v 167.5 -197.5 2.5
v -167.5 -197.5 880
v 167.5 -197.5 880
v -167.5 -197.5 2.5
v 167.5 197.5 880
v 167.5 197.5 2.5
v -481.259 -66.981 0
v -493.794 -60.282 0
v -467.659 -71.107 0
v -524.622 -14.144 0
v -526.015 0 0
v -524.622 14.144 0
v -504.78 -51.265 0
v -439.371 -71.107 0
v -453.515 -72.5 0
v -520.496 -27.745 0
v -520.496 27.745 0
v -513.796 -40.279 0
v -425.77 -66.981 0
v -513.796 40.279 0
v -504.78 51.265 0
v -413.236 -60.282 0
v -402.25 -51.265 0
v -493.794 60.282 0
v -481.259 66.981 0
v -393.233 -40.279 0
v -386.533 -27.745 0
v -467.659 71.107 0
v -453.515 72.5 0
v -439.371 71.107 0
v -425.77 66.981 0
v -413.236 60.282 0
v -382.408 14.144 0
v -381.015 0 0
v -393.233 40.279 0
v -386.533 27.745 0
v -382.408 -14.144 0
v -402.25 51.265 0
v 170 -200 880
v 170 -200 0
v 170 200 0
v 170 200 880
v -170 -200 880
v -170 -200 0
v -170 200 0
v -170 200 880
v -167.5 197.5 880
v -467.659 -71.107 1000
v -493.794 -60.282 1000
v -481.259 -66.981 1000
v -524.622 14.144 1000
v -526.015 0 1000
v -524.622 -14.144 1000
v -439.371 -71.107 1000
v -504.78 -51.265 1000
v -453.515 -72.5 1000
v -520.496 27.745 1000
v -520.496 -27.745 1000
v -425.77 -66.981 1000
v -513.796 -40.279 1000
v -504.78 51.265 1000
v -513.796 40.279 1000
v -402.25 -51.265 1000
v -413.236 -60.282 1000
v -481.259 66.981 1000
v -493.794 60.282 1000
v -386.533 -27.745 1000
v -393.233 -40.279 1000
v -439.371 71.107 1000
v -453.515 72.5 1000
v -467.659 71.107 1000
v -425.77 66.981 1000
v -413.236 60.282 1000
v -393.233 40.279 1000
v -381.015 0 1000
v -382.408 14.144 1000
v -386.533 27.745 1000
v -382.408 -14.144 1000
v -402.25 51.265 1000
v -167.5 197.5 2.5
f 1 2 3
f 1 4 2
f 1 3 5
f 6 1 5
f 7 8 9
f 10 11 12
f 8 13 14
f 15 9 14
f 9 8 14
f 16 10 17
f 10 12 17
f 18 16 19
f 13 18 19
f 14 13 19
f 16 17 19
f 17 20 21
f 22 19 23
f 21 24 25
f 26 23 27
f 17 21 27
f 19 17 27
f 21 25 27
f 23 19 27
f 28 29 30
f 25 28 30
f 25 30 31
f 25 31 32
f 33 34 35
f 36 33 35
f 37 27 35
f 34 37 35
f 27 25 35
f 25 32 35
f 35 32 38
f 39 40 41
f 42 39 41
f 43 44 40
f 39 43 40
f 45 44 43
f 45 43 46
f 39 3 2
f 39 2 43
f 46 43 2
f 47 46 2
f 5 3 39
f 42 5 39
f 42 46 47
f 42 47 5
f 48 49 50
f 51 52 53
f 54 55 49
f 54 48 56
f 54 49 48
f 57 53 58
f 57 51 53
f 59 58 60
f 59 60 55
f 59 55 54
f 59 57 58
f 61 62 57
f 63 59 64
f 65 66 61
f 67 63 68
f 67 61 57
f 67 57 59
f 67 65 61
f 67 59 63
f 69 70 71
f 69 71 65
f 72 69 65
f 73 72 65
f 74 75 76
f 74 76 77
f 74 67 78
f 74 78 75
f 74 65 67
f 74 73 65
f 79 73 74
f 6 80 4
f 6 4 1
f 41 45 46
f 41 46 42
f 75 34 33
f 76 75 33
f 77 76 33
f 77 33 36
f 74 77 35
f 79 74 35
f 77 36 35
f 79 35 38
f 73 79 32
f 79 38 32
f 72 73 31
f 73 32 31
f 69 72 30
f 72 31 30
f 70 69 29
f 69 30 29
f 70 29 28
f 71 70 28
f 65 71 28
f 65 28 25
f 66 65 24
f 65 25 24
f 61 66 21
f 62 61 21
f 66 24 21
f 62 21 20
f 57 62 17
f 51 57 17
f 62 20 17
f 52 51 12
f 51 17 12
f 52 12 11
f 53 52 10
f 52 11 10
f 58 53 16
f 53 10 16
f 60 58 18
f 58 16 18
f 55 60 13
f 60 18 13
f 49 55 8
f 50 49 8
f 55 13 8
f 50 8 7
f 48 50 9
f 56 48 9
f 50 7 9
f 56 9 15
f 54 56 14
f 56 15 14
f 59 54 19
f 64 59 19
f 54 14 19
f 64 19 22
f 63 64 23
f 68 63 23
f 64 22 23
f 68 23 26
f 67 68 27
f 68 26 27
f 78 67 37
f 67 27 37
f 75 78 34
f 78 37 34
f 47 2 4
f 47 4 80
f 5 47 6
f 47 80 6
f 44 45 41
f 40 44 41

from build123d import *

# Parameters (mm, degrees)
F0_W     = 340
F0_H     = 400
F1_DEPTH = 880
F2_T     = -2.5
F3_R     = 72.5
F4_DEPTH = 1000


with BuildPart() as f1:
    # F0 (on Top) → F1 (new body)
    with BuildSketch(Plane.XY):
        Rectangle(F0_W, F0_H)
    extrude(amount=F1_DEPTH)

    # F2
    f2_openings = [f1.faces().sort_by_distance(p)[0] for p in [
        (0, 0, 880),
    ]]
    offset(amount=F2_T, openings=f2_openings)


with BuildPart() as f4:
    # F3 (on face) → F4 (new body)
    with BuildSketch(Plane.XY):
        with Locations((-453.514755, 0)):
            Circle(F3_R)
    extrude(amount=F4_DEPTH)


solid = Compound([f1.part, f4.part])
